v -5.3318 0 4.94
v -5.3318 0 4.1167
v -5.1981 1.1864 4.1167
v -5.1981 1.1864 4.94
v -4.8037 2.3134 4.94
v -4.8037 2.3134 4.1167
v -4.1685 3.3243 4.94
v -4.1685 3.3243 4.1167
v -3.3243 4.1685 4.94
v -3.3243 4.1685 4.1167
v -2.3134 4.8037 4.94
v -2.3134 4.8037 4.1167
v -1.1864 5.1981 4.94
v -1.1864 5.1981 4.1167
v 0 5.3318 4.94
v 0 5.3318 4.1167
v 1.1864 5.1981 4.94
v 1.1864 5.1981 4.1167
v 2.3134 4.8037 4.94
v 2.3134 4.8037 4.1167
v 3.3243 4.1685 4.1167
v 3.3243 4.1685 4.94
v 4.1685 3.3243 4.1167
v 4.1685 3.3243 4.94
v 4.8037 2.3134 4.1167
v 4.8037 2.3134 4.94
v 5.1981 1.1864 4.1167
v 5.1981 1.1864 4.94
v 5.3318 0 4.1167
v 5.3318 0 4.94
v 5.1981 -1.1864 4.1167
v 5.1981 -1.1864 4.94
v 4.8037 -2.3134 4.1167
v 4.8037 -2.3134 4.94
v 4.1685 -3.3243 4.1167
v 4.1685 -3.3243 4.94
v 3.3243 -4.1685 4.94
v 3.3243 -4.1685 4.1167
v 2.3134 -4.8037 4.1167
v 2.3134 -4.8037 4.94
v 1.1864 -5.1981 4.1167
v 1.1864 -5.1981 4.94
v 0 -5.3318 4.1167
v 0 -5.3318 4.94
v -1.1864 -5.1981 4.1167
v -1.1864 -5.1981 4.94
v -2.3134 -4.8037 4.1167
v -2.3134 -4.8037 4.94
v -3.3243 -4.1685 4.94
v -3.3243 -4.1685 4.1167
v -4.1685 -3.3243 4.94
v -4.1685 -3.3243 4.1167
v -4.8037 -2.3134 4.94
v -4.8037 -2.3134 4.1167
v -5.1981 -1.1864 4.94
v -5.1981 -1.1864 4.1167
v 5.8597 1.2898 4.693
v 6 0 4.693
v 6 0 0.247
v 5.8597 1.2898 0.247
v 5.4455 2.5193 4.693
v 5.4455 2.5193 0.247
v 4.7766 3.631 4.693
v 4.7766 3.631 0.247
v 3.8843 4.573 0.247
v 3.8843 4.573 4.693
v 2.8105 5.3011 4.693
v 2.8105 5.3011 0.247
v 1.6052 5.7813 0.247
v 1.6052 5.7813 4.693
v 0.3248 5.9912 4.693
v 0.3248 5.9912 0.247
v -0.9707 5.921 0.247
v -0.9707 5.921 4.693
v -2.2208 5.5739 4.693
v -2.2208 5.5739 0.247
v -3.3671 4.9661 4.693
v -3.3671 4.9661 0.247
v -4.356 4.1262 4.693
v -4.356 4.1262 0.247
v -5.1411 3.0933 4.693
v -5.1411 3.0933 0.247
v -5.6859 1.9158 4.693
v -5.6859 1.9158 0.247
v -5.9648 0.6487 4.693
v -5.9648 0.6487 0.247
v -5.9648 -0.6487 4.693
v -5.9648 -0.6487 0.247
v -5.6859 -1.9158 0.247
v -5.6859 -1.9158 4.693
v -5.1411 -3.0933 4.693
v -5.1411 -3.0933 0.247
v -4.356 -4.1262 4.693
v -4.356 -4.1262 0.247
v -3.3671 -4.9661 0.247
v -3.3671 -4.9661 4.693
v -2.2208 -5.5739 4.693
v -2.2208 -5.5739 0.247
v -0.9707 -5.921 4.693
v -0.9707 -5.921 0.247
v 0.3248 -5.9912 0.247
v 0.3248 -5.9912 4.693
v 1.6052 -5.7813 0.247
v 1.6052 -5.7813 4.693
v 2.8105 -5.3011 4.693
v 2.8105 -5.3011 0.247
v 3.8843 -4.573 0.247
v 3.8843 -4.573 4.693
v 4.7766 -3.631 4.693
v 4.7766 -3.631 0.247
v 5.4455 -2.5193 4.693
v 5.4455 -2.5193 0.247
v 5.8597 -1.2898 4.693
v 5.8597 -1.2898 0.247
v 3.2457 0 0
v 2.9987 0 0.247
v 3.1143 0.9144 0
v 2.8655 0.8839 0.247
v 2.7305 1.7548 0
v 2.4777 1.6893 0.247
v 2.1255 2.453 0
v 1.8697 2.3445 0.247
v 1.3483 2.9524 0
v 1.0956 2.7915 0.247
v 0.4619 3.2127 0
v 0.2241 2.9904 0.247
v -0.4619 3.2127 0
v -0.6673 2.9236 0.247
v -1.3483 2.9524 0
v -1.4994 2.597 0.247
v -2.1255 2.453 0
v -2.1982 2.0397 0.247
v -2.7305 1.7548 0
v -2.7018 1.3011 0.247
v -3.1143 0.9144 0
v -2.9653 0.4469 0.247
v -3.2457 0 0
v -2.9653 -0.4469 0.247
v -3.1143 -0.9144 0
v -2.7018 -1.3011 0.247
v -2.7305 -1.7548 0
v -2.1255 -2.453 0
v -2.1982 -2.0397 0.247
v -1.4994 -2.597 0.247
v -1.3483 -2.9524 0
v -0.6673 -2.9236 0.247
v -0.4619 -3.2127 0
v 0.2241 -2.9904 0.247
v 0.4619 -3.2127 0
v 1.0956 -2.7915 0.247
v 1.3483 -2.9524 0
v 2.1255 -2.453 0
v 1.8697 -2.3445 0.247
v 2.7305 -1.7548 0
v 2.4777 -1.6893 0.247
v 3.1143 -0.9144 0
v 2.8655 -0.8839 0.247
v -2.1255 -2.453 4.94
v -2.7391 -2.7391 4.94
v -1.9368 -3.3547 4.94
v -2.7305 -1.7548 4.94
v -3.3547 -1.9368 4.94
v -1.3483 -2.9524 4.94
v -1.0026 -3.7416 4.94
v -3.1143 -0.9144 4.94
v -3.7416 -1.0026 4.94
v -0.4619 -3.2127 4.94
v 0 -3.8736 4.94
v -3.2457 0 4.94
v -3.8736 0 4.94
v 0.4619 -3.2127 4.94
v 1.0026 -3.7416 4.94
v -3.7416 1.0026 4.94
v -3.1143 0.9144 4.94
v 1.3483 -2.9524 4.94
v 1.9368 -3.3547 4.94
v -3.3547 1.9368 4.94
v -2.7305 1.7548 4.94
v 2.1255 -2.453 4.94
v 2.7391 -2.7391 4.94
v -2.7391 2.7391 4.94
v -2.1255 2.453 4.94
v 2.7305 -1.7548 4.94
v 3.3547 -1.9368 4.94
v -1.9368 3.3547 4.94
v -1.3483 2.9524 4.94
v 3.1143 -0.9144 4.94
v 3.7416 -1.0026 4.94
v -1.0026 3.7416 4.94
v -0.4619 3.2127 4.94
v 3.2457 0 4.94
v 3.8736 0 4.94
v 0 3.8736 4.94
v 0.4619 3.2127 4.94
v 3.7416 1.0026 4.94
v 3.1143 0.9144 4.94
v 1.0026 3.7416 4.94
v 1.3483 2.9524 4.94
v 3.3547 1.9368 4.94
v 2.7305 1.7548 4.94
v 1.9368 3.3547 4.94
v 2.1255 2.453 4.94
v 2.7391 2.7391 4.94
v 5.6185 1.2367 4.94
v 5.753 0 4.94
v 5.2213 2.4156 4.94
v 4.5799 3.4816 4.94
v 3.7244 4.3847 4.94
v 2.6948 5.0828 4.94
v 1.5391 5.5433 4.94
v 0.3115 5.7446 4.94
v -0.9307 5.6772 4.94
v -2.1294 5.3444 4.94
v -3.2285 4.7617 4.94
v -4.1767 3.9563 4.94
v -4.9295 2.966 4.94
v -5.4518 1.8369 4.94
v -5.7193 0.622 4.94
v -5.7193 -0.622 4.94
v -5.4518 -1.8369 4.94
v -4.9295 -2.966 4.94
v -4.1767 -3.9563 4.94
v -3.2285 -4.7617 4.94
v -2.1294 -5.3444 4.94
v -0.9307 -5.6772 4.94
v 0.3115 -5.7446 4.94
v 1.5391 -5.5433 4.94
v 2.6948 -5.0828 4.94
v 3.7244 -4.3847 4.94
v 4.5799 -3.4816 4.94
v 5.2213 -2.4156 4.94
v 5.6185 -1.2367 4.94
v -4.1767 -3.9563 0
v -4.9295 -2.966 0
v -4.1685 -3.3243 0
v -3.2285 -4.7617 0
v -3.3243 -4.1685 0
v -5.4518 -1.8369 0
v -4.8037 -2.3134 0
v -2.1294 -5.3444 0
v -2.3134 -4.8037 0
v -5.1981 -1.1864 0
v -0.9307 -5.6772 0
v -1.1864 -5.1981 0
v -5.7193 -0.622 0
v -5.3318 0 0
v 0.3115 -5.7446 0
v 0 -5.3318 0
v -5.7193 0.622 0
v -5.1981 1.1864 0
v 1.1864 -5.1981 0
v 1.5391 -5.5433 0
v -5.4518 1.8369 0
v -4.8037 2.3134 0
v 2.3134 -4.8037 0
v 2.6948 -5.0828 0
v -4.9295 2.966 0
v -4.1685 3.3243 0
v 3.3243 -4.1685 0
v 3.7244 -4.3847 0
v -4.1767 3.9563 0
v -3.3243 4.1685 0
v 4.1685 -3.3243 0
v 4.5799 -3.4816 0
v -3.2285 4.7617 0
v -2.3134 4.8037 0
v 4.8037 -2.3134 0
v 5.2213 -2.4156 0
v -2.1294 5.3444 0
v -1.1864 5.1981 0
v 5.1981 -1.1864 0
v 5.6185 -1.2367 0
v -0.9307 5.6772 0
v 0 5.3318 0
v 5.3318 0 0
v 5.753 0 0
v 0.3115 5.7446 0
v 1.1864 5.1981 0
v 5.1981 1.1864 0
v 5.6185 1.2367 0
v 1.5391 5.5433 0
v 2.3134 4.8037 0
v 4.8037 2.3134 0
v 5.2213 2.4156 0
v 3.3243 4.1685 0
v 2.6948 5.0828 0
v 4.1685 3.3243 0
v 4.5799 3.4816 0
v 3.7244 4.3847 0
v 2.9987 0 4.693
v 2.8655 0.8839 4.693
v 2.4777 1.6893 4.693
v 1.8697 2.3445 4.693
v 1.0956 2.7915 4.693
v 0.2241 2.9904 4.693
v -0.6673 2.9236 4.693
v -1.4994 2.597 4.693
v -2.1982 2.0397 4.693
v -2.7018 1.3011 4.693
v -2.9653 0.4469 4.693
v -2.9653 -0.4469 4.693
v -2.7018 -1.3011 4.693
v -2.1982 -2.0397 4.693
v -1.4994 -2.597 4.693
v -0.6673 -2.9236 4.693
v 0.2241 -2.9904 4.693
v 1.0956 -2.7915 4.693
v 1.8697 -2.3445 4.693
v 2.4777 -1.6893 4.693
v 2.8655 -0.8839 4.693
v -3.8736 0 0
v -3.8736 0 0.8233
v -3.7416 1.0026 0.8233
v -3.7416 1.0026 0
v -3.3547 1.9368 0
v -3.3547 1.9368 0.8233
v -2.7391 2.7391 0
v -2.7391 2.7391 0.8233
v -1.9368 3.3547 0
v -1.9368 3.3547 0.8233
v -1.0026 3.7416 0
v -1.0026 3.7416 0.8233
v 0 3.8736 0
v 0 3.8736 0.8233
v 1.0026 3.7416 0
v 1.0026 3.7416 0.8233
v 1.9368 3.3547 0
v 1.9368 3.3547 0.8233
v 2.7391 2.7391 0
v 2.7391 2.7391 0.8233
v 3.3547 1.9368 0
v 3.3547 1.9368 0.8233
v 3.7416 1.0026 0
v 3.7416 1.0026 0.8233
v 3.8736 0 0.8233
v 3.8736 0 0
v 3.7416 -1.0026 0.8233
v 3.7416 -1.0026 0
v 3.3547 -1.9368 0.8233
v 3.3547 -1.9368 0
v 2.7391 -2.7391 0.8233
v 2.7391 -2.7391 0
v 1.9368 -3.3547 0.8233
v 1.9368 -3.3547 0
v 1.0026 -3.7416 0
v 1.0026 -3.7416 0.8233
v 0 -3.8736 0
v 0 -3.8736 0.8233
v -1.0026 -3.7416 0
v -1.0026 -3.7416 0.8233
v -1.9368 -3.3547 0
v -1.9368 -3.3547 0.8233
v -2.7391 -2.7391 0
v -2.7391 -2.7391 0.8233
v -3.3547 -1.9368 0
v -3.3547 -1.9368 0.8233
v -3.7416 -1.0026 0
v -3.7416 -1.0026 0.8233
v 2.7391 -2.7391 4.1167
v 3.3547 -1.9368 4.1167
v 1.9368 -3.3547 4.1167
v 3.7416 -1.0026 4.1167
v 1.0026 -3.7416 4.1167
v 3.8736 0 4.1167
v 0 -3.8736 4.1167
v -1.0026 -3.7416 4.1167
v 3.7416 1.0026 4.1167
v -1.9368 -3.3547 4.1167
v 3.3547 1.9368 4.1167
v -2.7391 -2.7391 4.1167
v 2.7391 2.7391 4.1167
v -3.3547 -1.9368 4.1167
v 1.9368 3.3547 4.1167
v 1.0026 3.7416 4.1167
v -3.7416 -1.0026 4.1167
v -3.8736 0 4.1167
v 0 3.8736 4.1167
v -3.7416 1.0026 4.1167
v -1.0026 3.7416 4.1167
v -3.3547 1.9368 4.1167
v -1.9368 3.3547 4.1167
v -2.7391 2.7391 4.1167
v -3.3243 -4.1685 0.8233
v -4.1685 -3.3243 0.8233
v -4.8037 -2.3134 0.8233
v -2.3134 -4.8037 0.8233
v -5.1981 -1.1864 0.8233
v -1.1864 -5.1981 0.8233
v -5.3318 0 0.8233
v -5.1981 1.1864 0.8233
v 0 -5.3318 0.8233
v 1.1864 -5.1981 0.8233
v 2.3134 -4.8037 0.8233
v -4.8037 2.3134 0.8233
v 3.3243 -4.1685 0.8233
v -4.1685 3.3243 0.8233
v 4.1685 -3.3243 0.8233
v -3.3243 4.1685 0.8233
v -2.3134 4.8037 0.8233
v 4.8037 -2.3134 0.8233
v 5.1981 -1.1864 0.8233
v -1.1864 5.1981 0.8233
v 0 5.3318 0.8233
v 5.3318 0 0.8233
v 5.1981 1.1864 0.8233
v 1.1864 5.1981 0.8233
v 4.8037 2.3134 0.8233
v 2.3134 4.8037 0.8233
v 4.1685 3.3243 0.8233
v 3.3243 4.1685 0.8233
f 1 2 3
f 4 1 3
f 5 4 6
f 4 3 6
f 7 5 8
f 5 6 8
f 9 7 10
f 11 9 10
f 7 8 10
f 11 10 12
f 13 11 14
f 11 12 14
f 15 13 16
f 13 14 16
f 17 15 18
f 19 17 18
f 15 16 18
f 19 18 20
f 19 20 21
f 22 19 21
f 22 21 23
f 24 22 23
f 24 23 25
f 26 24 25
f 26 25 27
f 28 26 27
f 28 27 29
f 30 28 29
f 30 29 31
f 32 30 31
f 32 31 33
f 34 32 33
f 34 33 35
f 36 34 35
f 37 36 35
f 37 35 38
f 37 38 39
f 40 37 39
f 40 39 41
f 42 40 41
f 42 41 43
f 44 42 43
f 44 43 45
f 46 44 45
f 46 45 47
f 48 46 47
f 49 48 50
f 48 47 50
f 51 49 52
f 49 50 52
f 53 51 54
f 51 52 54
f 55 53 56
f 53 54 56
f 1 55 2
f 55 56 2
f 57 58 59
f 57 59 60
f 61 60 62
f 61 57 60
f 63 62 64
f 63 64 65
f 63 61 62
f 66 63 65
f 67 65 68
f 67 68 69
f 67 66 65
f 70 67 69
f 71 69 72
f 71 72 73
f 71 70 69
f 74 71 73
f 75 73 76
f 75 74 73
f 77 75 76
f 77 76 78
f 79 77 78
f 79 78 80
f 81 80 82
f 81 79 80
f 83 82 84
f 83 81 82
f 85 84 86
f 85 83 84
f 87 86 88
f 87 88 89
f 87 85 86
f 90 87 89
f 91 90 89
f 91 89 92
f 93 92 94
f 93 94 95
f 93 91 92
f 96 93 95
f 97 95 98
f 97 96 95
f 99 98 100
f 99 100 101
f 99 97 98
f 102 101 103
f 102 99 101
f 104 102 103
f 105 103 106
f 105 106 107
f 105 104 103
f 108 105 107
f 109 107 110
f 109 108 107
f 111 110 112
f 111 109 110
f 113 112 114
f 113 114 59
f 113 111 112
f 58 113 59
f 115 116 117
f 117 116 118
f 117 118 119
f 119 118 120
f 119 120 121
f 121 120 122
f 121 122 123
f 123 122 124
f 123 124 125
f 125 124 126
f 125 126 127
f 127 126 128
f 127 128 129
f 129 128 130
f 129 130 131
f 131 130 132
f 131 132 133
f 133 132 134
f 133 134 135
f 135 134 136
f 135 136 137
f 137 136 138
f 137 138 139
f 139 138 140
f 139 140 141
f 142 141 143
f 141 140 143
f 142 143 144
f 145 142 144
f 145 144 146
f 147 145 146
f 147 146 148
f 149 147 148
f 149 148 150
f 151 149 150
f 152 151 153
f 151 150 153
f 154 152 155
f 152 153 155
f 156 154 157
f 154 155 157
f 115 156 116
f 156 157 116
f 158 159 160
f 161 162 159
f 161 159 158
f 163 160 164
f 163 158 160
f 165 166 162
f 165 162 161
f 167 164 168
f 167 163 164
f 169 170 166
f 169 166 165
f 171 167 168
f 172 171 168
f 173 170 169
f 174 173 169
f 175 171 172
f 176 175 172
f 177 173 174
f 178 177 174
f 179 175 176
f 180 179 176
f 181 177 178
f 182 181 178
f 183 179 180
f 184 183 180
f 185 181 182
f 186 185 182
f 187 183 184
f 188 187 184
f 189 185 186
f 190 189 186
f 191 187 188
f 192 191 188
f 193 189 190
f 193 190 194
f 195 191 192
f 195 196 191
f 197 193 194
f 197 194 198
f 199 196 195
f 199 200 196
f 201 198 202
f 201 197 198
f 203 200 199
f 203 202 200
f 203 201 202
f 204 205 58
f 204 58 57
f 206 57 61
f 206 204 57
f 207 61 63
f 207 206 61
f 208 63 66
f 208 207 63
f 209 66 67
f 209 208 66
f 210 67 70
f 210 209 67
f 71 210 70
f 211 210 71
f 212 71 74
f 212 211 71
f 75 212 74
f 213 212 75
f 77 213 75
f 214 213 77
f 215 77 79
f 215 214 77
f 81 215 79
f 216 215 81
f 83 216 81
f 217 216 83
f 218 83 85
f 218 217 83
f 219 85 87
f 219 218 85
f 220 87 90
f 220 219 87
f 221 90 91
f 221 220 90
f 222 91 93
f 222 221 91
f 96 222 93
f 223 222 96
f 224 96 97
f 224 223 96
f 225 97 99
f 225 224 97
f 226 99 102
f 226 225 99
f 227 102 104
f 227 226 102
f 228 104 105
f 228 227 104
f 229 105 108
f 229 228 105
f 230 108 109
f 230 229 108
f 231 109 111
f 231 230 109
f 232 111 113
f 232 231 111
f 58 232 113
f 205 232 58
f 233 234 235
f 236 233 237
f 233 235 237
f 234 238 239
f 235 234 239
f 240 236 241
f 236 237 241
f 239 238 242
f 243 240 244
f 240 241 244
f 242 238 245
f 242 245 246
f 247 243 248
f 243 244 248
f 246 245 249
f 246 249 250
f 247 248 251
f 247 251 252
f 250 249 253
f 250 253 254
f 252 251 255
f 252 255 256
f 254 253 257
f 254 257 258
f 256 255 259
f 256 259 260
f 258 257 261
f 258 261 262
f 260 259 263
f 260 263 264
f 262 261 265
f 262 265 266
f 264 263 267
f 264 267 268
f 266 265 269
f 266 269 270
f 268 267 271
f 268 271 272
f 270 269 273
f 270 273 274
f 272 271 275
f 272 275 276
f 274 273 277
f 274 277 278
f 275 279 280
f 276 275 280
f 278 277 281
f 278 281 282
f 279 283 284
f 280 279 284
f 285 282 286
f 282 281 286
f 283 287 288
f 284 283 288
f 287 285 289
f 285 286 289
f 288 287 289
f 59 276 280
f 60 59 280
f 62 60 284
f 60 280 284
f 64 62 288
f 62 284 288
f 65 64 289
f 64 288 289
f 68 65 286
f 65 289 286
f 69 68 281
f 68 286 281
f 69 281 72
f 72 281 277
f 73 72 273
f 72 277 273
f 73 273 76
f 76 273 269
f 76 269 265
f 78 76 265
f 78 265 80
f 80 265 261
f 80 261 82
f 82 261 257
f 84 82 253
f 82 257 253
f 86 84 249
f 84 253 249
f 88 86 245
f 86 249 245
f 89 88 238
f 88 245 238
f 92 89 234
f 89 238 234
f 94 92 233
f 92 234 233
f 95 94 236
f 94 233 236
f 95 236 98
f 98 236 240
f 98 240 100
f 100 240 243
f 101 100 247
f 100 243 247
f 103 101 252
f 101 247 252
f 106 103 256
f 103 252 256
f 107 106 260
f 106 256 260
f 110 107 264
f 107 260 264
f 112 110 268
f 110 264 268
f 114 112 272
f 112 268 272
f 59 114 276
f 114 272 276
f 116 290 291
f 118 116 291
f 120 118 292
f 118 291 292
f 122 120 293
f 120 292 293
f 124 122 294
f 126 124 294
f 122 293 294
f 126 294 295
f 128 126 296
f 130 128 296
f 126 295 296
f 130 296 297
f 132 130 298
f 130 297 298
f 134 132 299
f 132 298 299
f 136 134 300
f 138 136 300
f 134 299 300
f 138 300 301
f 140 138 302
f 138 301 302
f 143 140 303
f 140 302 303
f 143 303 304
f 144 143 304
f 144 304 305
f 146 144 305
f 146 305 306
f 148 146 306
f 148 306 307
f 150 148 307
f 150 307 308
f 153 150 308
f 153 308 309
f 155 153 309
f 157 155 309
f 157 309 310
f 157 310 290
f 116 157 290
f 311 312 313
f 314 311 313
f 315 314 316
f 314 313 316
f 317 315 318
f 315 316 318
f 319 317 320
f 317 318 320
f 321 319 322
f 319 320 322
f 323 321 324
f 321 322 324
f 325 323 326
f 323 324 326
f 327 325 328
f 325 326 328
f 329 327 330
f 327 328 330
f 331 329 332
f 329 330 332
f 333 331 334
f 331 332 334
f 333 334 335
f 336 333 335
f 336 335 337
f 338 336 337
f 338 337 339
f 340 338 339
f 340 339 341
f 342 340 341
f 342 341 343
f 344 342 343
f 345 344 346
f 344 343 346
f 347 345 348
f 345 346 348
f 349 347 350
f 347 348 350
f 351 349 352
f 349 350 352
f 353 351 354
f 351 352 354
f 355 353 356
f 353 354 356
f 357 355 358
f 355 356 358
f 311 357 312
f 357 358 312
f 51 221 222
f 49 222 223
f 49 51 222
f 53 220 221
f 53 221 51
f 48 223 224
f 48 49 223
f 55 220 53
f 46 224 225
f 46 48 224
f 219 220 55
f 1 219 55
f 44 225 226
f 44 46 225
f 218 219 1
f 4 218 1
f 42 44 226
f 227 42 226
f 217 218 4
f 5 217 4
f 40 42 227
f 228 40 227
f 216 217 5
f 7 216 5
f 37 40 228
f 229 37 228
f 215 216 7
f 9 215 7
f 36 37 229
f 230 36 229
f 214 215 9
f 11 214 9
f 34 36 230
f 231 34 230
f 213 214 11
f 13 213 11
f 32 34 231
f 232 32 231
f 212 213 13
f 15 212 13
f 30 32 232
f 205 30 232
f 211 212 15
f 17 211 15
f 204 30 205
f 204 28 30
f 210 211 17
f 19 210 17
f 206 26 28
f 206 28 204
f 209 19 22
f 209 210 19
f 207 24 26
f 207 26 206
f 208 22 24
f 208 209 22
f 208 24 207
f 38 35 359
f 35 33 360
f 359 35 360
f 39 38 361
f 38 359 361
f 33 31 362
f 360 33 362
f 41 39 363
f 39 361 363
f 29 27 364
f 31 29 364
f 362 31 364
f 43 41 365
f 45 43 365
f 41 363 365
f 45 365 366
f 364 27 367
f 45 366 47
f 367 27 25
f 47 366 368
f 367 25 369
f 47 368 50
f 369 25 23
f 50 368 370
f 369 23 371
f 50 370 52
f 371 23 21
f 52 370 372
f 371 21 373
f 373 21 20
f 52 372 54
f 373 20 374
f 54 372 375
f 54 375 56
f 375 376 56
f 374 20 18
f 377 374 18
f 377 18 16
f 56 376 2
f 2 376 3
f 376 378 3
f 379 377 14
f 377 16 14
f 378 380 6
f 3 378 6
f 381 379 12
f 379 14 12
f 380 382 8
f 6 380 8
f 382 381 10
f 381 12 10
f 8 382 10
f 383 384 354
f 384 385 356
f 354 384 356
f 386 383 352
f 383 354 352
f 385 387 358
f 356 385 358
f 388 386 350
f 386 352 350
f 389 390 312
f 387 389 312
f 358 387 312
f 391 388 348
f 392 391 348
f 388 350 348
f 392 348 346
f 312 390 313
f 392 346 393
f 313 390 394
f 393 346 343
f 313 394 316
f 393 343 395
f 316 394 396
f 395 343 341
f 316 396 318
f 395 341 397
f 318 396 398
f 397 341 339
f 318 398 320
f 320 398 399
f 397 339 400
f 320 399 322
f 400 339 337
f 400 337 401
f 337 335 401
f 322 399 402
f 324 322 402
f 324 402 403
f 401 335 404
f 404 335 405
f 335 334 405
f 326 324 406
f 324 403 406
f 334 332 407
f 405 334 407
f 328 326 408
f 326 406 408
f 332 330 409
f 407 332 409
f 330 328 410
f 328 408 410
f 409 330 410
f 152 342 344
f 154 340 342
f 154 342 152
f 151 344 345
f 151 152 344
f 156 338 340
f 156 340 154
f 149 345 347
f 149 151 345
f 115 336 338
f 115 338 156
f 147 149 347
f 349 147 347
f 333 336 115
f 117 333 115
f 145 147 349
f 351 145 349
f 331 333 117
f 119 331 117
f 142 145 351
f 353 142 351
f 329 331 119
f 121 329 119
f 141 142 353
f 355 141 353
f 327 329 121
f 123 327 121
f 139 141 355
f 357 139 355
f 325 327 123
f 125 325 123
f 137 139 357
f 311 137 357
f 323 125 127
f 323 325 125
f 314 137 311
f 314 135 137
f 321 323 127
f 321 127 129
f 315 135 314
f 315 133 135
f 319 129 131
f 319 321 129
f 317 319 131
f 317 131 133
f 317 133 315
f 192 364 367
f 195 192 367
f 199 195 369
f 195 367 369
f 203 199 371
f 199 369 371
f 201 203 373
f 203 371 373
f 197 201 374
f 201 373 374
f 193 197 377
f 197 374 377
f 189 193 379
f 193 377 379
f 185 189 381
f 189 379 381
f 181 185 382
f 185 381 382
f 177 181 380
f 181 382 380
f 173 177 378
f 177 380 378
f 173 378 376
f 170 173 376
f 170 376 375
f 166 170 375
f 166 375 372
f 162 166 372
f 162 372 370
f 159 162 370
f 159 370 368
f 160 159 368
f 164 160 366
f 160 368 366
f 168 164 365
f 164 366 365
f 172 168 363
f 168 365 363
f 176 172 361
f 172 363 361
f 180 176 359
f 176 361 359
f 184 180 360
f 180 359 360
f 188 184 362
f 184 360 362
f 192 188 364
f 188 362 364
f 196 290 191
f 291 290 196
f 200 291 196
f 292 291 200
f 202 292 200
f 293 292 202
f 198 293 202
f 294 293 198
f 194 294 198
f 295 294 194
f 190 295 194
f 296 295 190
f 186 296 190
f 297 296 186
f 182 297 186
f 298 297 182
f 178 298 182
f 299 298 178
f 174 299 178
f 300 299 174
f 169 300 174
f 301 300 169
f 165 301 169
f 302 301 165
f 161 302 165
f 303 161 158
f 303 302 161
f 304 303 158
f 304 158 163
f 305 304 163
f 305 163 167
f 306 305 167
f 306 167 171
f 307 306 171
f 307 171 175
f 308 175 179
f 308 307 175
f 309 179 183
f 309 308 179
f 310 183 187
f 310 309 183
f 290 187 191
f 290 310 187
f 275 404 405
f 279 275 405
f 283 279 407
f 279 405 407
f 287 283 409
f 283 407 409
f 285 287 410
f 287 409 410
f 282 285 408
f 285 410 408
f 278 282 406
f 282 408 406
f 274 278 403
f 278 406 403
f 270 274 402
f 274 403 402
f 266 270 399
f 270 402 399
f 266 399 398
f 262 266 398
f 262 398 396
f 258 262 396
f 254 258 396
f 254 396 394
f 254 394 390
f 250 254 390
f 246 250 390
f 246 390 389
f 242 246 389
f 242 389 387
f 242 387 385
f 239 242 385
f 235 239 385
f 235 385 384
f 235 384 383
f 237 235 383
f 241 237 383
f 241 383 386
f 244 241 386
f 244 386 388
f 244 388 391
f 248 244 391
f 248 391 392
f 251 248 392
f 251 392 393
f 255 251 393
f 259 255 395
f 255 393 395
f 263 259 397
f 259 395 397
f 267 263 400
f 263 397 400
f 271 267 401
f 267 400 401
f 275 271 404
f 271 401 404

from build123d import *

# Parameters (mm, degrees)
SKETCH1_R      = 6
EXTRUDE1_DEPTH = 4.94
HOLE1_D        = 10.6635
HOLE1_DEPTH    = 0.823333333
SKETCH4_R      = 3.873625
EXTRUDE2_DEPTH = 0.823333333
HOLE2_D        = 10.6635
HOLE2_DEPTH    = 0.823333333
SKETCH7_R      = 3.873625
EXTRUDE3_DEPTH = 0.823333333
HOLE3_D        = 5.9975
HOLE3_DEPTH    = 4.94
CHAMFER1_SIZE  = 0.247


with BuildPart() as part:
    # Sketch1 → Extrude1 (new body)
    with BuildSketch(Plane.XY.offset(4.94)):
        Circle(SKETCH1_R)
    extrude(amount=-EXTRUDE1_DEPTH)

    # Hole1
    with Locations(Plane.XY.offset(4.94)):
        with Locations((0, 0)):
            Hole(HOLE1_D / 2, depth=HOLE1_DEPTH)

    # Sketch4 → Extrude2 (add)
    with BuildSketch(Plane.XY.offset(4.116666667)):
        Circle(SKETCH4_R)
    extrude(amount=EXTRUDE2_DEPTH)

    # Hole2
    with Locations(Plane(origin=(0, 0, 0), x_dir=(-1, 0, 0), z_dir=(0, 0, -1))):
        with Locations((0, 0)):
            Hole(HOLE2_D / 2, depth=HOLE2_DEPTH)

    # Sketch7 → Extrude3 (add)
    with BuildSketch(Plane(origin=(0, 0, 0.823333333), x_dir=(-1, 0, 0), z_dir=(0, 0, -1))):
        Circle(SKETCH7_R)
    extrude(amount=EXTRUDE3_DEPTH)

    # Hole3
    with Locations(Plane(origin=(0, 0, 0), x_dir=(-1, 0, 0), z_dir=(0, 0, -1))):
        with Locations((0, 0)):
            Hole(HOLE3_D / 2, depth=HOLE3_DEPTH)

    # Chamfer1
    chamfer1_edges = [part.edges().sort_by_distance(p)[0] for p in [
        (-6, 0, 4.94),
        (-2.99875, 0, 0),
        (-2.99875, 0, 4.94),
        (-6, 0, 0),
    ]]
    chamfer(chamfer1_edges, length=CHAMFER1_SIZE)


solid = part.part
